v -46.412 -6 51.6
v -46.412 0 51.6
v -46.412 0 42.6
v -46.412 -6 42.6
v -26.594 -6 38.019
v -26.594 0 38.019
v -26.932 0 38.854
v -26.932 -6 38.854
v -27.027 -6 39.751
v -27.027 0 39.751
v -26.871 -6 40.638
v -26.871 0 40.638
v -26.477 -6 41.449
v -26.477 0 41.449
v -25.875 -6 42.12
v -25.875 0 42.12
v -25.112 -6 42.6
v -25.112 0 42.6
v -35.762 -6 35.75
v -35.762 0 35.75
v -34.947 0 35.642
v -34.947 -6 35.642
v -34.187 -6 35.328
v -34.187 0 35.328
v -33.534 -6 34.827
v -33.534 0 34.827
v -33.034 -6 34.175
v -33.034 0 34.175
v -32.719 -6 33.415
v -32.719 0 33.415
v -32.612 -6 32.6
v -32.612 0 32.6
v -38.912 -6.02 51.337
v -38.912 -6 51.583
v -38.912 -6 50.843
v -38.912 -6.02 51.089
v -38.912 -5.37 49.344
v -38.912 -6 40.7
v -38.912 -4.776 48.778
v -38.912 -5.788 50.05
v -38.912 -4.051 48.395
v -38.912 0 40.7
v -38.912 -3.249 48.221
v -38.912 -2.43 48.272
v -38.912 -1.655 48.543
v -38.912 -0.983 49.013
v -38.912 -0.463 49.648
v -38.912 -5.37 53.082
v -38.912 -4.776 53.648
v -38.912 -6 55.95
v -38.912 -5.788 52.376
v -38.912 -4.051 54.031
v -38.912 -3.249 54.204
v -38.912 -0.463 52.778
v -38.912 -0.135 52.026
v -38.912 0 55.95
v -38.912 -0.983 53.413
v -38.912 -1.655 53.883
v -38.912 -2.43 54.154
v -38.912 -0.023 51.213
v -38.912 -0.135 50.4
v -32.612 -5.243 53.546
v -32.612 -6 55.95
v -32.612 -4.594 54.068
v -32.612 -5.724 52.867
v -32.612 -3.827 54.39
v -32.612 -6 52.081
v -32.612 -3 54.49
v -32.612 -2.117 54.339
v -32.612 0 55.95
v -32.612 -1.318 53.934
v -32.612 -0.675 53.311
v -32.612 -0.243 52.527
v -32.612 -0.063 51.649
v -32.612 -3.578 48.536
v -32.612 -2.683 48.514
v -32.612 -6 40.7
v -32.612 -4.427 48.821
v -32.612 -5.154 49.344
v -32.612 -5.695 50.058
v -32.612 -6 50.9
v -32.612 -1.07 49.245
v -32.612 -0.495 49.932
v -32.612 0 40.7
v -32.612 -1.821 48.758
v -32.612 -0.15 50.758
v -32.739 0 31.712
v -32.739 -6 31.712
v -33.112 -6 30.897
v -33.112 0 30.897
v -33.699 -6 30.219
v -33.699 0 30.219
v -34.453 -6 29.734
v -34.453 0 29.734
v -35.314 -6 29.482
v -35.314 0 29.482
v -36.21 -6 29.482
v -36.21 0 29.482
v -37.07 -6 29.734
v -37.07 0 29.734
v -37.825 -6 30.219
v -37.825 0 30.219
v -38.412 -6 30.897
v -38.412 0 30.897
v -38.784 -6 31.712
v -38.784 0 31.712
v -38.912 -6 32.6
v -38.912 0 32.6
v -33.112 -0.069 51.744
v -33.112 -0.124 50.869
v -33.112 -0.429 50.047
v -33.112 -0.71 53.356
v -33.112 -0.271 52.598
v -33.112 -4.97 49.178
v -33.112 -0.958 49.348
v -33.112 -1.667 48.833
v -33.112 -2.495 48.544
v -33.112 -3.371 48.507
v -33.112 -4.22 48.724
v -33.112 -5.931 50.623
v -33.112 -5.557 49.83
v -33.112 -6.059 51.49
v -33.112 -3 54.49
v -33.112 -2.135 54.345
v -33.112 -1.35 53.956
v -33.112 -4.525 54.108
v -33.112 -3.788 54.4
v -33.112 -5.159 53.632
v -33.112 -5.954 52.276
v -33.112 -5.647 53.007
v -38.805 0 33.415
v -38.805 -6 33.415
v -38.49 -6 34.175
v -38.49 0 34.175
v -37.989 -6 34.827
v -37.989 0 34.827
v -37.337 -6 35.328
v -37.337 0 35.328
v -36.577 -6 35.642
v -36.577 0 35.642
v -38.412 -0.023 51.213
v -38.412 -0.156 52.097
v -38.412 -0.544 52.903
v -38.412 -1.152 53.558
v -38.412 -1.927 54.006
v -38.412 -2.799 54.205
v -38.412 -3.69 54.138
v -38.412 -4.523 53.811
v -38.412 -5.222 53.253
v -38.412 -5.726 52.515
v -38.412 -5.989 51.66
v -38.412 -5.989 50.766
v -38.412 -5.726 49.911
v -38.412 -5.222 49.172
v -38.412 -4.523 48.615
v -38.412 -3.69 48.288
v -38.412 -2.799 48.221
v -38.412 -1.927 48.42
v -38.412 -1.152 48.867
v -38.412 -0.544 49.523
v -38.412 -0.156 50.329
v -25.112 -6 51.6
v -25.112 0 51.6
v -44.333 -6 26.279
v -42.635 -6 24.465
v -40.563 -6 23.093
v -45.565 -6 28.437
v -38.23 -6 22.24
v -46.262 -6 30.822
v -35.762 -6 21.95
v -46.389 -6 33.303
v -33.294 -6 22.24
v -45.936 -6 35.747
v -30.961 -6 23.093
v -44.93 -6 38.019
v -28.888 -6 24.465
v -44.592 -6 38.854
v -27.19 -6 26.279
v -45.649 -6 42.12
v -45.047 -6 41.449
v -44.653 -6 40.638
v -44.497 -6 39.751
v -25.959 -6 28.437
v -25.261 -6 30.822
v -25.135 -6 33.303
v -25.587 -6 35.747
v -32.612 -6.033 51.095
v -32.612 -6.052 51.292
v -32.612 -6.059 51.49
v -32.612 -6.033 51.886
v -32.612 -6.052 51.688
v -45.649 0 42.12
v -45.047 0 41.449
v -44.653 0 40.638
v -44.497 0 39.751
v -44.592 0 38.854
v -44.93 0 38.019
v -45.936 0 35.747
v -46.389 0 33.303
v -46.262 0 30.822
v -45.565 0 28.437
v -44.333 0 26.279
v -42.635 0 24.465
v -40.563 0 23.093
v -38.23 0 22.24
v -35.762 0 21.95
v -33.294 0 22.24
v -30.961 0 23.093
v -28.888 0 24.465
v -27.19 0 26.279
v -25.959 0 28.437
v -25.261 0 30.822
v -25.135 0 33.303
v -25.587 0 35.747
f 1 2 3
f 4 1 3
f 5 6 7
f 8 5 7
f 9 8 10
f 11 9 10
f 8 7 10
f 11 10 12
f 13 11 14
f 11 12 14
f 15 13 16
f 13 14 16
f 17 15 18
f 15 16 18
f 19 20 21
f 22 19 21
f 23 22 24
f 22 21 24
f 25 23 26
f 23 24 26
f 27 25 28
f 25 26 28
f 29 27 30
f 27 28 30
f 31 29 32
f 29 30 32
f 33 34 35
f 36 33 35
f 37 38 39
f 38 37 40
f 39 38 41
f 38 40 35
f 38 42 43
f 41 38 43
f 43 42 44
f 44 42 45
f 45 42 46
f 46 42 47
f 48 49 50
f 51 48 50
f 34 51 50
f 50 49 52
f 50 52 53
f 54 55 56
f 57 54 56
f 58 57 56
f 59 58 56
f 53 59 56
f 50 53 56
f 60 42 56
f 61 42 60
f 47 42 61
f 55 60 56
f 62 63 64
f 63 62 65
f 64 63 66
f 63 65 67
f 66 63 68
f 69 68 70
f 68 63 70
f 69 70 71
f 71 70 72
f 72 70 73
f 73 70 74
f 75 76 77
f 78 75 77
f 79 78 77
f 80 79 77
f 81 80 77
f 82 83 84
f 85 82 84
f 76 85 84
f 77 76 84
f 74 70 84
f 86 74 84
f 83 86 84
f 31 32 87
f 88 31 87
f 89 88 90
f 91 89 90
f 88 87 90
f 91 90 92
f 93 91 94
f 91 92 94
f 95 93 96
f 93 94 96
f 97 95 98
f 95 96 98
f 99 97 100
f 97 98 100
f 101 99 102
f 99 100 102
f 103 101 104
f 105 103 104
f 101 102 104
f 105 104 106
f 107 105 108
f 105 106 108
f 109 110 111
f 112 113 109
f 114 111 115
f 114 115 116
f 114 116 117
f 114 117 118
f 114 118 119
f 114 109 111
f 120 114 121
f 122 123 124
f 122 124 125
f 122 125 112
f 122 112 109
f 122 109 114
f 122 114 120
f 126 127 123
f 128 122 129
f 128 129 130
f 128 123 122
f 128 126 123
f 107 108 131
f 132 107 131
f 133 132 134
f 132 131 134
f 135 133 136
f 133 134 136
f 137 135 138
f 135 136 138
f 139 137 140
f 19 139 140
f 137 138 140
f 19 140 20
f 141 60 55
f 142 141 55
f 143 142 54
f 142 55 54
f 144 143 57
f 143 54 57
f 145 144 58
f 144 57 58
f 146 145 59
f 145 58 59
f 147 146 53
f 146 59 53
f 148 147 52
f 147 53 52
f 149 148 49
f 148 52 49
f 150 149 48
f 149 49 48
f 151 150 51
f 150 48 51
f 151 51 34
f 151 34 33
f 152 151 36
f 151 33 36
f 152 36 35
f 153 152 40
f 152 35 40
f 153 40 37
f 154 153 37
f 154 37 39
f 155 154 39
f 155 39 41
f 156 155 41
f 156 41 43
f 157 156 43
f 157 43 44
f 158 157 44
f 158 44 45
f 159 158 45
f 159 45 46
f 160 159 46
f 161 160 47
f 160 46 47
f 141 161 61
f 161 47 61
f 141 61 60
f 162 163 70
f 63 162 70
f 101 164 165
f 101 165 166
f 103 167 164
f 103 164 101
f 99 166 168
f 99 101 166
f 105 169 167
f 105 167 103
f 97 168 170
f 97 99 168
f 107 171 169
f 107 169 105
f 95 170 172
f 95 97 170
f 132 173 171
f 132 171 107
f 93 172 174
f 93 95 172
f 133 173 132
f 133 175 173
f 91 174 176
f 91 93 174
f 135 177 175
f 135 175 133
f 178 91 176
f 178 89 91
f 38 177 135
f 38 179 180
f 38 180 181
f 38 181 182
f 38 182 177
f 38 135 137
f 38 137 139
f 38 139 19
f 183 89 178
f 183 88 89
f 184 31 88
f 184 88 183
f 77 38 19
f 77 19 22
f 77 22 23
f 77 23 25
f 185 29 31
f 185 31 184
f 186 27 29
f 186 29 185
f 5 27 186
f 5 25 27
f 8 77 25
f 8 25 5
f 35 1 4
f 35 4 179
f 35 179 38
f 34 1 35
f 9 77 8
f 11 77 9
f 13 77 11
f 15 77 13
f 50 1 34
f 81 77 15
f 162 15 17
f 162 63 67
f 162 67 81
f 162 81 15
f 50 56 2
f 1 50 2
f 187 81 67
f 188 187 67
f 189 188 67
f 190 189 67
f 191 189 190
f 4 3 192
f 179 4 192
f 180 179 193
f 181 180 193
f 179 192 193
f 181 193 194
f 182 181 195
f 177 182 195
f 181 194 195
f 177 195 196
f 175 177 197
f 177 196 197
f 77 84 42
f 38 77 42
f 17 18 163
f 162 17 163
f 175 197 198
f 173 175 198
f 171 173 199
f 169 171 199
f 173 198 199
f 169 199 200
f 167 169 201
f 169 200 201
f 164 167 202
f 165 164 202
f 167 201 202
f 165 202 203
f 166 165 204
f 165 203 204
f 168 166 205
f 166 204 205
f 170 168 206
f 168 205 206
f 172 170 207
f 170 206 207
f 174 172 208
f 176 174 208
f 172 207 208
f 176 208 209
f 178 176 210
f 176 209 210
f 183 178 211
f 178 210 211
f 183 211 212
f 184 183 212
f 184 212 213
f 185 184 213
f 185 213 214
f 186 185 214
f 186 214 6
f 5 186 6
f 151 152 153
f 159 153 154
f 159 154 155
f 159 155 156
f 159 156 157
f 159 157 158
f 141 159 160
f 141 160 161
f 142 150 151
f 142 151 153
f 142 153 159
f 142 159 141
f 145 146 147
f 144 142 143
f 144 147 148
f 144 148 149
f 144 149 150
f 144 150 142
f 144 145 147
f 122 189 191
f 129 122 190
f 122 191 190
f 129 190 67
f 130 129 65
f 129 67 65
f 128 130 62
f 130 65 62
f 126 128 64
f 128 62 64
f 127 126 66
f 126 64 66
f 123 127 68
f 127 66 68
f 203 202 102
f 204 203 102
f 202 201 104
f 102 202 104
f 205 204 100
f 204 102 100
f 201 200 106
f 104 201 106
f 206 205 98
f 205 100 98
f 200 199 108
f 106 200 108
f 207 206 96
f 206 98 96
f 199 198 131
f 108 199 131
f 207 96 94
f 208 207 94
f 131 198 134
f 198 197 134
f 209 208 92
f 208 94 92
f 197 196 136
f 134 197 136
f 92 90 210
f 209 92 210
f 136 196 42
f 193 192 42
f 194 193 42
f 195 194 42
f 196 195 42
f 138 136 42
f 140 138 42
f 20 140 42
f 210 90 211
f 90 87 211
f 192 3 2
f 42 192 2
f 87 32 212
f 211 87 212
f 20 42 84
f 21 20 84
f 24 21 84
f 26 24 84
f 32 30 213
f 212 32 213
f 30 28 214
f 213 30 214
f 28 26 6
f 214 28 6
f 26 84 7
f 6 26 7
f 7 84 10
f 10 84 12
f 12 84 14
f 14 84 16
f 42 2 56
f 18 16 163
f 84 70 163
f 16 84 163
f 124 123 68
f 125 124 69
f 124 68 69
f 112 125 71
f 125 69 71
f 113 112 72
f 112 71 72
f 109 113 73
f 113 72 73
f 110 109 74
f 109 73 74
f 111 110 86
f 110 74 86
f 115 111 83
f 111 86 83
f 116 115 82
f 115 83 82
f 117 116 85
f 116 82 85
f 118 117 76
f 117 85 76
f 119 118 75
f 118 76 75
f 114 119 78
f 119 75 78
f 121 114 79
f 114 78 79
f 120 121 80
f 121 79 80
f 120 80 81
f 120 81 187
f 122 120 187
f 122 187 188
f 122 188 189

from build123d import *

# Parameters (mm, degrees)
F1_DEPTH = 6
F3_DEPTH = 0.5
F4_R     = 3
F5_DEPTH = 0.5
F6_DEPTH = 6


with BuildPart() as f1:
    # F0 (on Front) → F1 (new body)
    with BuildSketch(Plane.XZ):
        with BuildLine():
            Line((-38.911887, 40.699648), (-38.911887, 42.773143))
            ThreePointArc((-38.911887, 42.773143), (-42.363898, 40.956439), (-44.930181, 38.018585))
            ThreePointArc((-44.930181, 38.018585), (-35.761887, 21.949648), (-26.593592, 38.018585))
            ThreePointArc((-26.593592, 38.018585), (-29.159876, 40.956439), (-32.611887, 42.773143))
            Line((-32.611887, 42.773143), (-32.611887, 40.699648))
            Line((-32.611887, 40.699648), (-35.761887, 40.699648))
            Line((-35.761887, 40.699648), (-38.911887, 40.699648))
        make_face()
        with BuildLine():
            ThreePointArc((-35.761887, 35.749648), (-33.5345, 34.827035), (-32.611887, 32.599648))
            ThreePointArc((-32.611887, 32.599648), (-35.761887, 29.449648), (-38.911887, 32.599648))
            ThreePointArc((-38.911887, 32.599648), (-37.989273, 34.827035), (-35.761887, 35.749648))
        make_face(mode=Mode.SUBTRACT)
        with BuildLine():
            ThreePointArc((-44.930181, 38.018585), (-42.363898, 40.956439), (-38.911887, 42.773143))
            Line((-38.911887, 42.773143), (-38.911887, 55.949648))
            Line((-38.911887, 55.949648), (-46.411887, 51.599648))
            Line((-46.411887, 51.599648), (-46.411887, 42.599648))
            ThreePointArc((-46.411887, 42.599648), (-44.652769, 40.638466), (-44.930181, 38.018585))
        make_face()
        with BuildLine():
            ThreePointArc((-32.611887, 42.773143), (-29.159876, 40.956439), (-26.593592, 38.018585))
            ThreePointArc((-26.593592, 38.018585), (-26.871004, 40.638466), (-25.111887, 42.599648))
            Line((-25.111887, 42.599648), (-25.111887, 51.599648))
            Line((-25.111887, 51.599648), (-32.611887, 55.949648))
            Line((-32.611887, 55.949648), (-32.611887, 42.773143))
        make_face()
    extrude(amount=F1_DEPTH)

    # F2 (on face) → F3 (join)
    with BuildSketch(Plane(origin=(-32.611887, 0, 0), x_dir=(0, -1, 0), z_dir=(-1, 0, 0))):
        with BuildLine():
            ThreePointArc((3, 54.489769), (0.958263, 49.348364), (6.05872, 51.490344))
            ThreePointArc((6.05872, 51.490344), (5.159177, 53.632325), (3, 54.489769))
        make_face()
    extrude(amount=F3_DEPTH)

    # F4 (on face) → F5 (join)
    with BuildSketch(Plane.YZ.offset(-38.911887)):
        with Locations((-3.022905, 51.212981)):
            Circle(F4_R)
    extrude(amount=F5_DEPTH)

    # F0 (on Front) → F6 (join)
    with BuildSketch(Plane.XZ):
        with BuildLine():
            Line((-38.911887, 40.699648), (-38.911887, 42.773143))
            ThreePointArc((-38.911887, 42.773143), (-42.363898, 40.956439), (-44.930181, 38.018585))
            ThreePointArc((-44.930181, 38.018585), (-35.761887, 21.949648), (-26.593592, 38.018585))
            ThreePointArc((-26.593592, 38.018585), (-29.159876, 40.956439), (-32.611887, 42.773143))
            Line((-32.611887, 42.773143), (-32.611887, 40.699648))
            Line((-32.611887, 40.699648), (-35.761887, 40.699648))
            Line((-35.761887, 40.699648), (-38.911887, 40.699648))
        make_face()
        with BuildLine():
            ThreePointArc((-35.761887, 35.749648), (-33.5345, 34.827035), (-32.611887, 32.599648))
            ThreePointArc((-32.611887, 32.599648), (-35.761887, 29.449648), (-38.911887, 32.599648))
            ThreePointArc((-38.911887, 32.599648), (-37.989273, 34.827035), (-35.761887, 35.749648))
        make_face(mode=Mode.SUBTRACT)
        with BuildLine():
            ThreePointArc((-44.930181, 38.018585), (-42.363898, 40.956439), (-38.911887, 42.773143))
            Line((-38.911887, 42.773143), (-38.911887, 55.949648))
            Line((-38.911887, 55.949648), (-46.411887, 51.599648))
            Line((-46.411887, 51.599648), (-46.411887, 42.599648))
            ThreePointArc((-46.411887, 42.599648), (-44.652769, 40.638466), (-44.930181, 38.018585))
        make_face()
        with BuildLine():
            ThreePointArc((-32.611887, 42.773143), (-29.159876, 40.956439), (-26.593592, 38.018585))
            ThreePointArc((-26.593592, 38.018585), (-26.871004, 40.638466), (-25.111887, 42.599648))
            Line((-25.111887, 42.599648), (-25.111887, 51.599648))
            Line((-25.111887, 51.599648), (-32.611887, 55.949648))
            Line((-32.611887, 55.949648), (-32.611887, 42.773143))
        make_face()
    extrude(amount=F6_DEPTH)


solid = f1.part
